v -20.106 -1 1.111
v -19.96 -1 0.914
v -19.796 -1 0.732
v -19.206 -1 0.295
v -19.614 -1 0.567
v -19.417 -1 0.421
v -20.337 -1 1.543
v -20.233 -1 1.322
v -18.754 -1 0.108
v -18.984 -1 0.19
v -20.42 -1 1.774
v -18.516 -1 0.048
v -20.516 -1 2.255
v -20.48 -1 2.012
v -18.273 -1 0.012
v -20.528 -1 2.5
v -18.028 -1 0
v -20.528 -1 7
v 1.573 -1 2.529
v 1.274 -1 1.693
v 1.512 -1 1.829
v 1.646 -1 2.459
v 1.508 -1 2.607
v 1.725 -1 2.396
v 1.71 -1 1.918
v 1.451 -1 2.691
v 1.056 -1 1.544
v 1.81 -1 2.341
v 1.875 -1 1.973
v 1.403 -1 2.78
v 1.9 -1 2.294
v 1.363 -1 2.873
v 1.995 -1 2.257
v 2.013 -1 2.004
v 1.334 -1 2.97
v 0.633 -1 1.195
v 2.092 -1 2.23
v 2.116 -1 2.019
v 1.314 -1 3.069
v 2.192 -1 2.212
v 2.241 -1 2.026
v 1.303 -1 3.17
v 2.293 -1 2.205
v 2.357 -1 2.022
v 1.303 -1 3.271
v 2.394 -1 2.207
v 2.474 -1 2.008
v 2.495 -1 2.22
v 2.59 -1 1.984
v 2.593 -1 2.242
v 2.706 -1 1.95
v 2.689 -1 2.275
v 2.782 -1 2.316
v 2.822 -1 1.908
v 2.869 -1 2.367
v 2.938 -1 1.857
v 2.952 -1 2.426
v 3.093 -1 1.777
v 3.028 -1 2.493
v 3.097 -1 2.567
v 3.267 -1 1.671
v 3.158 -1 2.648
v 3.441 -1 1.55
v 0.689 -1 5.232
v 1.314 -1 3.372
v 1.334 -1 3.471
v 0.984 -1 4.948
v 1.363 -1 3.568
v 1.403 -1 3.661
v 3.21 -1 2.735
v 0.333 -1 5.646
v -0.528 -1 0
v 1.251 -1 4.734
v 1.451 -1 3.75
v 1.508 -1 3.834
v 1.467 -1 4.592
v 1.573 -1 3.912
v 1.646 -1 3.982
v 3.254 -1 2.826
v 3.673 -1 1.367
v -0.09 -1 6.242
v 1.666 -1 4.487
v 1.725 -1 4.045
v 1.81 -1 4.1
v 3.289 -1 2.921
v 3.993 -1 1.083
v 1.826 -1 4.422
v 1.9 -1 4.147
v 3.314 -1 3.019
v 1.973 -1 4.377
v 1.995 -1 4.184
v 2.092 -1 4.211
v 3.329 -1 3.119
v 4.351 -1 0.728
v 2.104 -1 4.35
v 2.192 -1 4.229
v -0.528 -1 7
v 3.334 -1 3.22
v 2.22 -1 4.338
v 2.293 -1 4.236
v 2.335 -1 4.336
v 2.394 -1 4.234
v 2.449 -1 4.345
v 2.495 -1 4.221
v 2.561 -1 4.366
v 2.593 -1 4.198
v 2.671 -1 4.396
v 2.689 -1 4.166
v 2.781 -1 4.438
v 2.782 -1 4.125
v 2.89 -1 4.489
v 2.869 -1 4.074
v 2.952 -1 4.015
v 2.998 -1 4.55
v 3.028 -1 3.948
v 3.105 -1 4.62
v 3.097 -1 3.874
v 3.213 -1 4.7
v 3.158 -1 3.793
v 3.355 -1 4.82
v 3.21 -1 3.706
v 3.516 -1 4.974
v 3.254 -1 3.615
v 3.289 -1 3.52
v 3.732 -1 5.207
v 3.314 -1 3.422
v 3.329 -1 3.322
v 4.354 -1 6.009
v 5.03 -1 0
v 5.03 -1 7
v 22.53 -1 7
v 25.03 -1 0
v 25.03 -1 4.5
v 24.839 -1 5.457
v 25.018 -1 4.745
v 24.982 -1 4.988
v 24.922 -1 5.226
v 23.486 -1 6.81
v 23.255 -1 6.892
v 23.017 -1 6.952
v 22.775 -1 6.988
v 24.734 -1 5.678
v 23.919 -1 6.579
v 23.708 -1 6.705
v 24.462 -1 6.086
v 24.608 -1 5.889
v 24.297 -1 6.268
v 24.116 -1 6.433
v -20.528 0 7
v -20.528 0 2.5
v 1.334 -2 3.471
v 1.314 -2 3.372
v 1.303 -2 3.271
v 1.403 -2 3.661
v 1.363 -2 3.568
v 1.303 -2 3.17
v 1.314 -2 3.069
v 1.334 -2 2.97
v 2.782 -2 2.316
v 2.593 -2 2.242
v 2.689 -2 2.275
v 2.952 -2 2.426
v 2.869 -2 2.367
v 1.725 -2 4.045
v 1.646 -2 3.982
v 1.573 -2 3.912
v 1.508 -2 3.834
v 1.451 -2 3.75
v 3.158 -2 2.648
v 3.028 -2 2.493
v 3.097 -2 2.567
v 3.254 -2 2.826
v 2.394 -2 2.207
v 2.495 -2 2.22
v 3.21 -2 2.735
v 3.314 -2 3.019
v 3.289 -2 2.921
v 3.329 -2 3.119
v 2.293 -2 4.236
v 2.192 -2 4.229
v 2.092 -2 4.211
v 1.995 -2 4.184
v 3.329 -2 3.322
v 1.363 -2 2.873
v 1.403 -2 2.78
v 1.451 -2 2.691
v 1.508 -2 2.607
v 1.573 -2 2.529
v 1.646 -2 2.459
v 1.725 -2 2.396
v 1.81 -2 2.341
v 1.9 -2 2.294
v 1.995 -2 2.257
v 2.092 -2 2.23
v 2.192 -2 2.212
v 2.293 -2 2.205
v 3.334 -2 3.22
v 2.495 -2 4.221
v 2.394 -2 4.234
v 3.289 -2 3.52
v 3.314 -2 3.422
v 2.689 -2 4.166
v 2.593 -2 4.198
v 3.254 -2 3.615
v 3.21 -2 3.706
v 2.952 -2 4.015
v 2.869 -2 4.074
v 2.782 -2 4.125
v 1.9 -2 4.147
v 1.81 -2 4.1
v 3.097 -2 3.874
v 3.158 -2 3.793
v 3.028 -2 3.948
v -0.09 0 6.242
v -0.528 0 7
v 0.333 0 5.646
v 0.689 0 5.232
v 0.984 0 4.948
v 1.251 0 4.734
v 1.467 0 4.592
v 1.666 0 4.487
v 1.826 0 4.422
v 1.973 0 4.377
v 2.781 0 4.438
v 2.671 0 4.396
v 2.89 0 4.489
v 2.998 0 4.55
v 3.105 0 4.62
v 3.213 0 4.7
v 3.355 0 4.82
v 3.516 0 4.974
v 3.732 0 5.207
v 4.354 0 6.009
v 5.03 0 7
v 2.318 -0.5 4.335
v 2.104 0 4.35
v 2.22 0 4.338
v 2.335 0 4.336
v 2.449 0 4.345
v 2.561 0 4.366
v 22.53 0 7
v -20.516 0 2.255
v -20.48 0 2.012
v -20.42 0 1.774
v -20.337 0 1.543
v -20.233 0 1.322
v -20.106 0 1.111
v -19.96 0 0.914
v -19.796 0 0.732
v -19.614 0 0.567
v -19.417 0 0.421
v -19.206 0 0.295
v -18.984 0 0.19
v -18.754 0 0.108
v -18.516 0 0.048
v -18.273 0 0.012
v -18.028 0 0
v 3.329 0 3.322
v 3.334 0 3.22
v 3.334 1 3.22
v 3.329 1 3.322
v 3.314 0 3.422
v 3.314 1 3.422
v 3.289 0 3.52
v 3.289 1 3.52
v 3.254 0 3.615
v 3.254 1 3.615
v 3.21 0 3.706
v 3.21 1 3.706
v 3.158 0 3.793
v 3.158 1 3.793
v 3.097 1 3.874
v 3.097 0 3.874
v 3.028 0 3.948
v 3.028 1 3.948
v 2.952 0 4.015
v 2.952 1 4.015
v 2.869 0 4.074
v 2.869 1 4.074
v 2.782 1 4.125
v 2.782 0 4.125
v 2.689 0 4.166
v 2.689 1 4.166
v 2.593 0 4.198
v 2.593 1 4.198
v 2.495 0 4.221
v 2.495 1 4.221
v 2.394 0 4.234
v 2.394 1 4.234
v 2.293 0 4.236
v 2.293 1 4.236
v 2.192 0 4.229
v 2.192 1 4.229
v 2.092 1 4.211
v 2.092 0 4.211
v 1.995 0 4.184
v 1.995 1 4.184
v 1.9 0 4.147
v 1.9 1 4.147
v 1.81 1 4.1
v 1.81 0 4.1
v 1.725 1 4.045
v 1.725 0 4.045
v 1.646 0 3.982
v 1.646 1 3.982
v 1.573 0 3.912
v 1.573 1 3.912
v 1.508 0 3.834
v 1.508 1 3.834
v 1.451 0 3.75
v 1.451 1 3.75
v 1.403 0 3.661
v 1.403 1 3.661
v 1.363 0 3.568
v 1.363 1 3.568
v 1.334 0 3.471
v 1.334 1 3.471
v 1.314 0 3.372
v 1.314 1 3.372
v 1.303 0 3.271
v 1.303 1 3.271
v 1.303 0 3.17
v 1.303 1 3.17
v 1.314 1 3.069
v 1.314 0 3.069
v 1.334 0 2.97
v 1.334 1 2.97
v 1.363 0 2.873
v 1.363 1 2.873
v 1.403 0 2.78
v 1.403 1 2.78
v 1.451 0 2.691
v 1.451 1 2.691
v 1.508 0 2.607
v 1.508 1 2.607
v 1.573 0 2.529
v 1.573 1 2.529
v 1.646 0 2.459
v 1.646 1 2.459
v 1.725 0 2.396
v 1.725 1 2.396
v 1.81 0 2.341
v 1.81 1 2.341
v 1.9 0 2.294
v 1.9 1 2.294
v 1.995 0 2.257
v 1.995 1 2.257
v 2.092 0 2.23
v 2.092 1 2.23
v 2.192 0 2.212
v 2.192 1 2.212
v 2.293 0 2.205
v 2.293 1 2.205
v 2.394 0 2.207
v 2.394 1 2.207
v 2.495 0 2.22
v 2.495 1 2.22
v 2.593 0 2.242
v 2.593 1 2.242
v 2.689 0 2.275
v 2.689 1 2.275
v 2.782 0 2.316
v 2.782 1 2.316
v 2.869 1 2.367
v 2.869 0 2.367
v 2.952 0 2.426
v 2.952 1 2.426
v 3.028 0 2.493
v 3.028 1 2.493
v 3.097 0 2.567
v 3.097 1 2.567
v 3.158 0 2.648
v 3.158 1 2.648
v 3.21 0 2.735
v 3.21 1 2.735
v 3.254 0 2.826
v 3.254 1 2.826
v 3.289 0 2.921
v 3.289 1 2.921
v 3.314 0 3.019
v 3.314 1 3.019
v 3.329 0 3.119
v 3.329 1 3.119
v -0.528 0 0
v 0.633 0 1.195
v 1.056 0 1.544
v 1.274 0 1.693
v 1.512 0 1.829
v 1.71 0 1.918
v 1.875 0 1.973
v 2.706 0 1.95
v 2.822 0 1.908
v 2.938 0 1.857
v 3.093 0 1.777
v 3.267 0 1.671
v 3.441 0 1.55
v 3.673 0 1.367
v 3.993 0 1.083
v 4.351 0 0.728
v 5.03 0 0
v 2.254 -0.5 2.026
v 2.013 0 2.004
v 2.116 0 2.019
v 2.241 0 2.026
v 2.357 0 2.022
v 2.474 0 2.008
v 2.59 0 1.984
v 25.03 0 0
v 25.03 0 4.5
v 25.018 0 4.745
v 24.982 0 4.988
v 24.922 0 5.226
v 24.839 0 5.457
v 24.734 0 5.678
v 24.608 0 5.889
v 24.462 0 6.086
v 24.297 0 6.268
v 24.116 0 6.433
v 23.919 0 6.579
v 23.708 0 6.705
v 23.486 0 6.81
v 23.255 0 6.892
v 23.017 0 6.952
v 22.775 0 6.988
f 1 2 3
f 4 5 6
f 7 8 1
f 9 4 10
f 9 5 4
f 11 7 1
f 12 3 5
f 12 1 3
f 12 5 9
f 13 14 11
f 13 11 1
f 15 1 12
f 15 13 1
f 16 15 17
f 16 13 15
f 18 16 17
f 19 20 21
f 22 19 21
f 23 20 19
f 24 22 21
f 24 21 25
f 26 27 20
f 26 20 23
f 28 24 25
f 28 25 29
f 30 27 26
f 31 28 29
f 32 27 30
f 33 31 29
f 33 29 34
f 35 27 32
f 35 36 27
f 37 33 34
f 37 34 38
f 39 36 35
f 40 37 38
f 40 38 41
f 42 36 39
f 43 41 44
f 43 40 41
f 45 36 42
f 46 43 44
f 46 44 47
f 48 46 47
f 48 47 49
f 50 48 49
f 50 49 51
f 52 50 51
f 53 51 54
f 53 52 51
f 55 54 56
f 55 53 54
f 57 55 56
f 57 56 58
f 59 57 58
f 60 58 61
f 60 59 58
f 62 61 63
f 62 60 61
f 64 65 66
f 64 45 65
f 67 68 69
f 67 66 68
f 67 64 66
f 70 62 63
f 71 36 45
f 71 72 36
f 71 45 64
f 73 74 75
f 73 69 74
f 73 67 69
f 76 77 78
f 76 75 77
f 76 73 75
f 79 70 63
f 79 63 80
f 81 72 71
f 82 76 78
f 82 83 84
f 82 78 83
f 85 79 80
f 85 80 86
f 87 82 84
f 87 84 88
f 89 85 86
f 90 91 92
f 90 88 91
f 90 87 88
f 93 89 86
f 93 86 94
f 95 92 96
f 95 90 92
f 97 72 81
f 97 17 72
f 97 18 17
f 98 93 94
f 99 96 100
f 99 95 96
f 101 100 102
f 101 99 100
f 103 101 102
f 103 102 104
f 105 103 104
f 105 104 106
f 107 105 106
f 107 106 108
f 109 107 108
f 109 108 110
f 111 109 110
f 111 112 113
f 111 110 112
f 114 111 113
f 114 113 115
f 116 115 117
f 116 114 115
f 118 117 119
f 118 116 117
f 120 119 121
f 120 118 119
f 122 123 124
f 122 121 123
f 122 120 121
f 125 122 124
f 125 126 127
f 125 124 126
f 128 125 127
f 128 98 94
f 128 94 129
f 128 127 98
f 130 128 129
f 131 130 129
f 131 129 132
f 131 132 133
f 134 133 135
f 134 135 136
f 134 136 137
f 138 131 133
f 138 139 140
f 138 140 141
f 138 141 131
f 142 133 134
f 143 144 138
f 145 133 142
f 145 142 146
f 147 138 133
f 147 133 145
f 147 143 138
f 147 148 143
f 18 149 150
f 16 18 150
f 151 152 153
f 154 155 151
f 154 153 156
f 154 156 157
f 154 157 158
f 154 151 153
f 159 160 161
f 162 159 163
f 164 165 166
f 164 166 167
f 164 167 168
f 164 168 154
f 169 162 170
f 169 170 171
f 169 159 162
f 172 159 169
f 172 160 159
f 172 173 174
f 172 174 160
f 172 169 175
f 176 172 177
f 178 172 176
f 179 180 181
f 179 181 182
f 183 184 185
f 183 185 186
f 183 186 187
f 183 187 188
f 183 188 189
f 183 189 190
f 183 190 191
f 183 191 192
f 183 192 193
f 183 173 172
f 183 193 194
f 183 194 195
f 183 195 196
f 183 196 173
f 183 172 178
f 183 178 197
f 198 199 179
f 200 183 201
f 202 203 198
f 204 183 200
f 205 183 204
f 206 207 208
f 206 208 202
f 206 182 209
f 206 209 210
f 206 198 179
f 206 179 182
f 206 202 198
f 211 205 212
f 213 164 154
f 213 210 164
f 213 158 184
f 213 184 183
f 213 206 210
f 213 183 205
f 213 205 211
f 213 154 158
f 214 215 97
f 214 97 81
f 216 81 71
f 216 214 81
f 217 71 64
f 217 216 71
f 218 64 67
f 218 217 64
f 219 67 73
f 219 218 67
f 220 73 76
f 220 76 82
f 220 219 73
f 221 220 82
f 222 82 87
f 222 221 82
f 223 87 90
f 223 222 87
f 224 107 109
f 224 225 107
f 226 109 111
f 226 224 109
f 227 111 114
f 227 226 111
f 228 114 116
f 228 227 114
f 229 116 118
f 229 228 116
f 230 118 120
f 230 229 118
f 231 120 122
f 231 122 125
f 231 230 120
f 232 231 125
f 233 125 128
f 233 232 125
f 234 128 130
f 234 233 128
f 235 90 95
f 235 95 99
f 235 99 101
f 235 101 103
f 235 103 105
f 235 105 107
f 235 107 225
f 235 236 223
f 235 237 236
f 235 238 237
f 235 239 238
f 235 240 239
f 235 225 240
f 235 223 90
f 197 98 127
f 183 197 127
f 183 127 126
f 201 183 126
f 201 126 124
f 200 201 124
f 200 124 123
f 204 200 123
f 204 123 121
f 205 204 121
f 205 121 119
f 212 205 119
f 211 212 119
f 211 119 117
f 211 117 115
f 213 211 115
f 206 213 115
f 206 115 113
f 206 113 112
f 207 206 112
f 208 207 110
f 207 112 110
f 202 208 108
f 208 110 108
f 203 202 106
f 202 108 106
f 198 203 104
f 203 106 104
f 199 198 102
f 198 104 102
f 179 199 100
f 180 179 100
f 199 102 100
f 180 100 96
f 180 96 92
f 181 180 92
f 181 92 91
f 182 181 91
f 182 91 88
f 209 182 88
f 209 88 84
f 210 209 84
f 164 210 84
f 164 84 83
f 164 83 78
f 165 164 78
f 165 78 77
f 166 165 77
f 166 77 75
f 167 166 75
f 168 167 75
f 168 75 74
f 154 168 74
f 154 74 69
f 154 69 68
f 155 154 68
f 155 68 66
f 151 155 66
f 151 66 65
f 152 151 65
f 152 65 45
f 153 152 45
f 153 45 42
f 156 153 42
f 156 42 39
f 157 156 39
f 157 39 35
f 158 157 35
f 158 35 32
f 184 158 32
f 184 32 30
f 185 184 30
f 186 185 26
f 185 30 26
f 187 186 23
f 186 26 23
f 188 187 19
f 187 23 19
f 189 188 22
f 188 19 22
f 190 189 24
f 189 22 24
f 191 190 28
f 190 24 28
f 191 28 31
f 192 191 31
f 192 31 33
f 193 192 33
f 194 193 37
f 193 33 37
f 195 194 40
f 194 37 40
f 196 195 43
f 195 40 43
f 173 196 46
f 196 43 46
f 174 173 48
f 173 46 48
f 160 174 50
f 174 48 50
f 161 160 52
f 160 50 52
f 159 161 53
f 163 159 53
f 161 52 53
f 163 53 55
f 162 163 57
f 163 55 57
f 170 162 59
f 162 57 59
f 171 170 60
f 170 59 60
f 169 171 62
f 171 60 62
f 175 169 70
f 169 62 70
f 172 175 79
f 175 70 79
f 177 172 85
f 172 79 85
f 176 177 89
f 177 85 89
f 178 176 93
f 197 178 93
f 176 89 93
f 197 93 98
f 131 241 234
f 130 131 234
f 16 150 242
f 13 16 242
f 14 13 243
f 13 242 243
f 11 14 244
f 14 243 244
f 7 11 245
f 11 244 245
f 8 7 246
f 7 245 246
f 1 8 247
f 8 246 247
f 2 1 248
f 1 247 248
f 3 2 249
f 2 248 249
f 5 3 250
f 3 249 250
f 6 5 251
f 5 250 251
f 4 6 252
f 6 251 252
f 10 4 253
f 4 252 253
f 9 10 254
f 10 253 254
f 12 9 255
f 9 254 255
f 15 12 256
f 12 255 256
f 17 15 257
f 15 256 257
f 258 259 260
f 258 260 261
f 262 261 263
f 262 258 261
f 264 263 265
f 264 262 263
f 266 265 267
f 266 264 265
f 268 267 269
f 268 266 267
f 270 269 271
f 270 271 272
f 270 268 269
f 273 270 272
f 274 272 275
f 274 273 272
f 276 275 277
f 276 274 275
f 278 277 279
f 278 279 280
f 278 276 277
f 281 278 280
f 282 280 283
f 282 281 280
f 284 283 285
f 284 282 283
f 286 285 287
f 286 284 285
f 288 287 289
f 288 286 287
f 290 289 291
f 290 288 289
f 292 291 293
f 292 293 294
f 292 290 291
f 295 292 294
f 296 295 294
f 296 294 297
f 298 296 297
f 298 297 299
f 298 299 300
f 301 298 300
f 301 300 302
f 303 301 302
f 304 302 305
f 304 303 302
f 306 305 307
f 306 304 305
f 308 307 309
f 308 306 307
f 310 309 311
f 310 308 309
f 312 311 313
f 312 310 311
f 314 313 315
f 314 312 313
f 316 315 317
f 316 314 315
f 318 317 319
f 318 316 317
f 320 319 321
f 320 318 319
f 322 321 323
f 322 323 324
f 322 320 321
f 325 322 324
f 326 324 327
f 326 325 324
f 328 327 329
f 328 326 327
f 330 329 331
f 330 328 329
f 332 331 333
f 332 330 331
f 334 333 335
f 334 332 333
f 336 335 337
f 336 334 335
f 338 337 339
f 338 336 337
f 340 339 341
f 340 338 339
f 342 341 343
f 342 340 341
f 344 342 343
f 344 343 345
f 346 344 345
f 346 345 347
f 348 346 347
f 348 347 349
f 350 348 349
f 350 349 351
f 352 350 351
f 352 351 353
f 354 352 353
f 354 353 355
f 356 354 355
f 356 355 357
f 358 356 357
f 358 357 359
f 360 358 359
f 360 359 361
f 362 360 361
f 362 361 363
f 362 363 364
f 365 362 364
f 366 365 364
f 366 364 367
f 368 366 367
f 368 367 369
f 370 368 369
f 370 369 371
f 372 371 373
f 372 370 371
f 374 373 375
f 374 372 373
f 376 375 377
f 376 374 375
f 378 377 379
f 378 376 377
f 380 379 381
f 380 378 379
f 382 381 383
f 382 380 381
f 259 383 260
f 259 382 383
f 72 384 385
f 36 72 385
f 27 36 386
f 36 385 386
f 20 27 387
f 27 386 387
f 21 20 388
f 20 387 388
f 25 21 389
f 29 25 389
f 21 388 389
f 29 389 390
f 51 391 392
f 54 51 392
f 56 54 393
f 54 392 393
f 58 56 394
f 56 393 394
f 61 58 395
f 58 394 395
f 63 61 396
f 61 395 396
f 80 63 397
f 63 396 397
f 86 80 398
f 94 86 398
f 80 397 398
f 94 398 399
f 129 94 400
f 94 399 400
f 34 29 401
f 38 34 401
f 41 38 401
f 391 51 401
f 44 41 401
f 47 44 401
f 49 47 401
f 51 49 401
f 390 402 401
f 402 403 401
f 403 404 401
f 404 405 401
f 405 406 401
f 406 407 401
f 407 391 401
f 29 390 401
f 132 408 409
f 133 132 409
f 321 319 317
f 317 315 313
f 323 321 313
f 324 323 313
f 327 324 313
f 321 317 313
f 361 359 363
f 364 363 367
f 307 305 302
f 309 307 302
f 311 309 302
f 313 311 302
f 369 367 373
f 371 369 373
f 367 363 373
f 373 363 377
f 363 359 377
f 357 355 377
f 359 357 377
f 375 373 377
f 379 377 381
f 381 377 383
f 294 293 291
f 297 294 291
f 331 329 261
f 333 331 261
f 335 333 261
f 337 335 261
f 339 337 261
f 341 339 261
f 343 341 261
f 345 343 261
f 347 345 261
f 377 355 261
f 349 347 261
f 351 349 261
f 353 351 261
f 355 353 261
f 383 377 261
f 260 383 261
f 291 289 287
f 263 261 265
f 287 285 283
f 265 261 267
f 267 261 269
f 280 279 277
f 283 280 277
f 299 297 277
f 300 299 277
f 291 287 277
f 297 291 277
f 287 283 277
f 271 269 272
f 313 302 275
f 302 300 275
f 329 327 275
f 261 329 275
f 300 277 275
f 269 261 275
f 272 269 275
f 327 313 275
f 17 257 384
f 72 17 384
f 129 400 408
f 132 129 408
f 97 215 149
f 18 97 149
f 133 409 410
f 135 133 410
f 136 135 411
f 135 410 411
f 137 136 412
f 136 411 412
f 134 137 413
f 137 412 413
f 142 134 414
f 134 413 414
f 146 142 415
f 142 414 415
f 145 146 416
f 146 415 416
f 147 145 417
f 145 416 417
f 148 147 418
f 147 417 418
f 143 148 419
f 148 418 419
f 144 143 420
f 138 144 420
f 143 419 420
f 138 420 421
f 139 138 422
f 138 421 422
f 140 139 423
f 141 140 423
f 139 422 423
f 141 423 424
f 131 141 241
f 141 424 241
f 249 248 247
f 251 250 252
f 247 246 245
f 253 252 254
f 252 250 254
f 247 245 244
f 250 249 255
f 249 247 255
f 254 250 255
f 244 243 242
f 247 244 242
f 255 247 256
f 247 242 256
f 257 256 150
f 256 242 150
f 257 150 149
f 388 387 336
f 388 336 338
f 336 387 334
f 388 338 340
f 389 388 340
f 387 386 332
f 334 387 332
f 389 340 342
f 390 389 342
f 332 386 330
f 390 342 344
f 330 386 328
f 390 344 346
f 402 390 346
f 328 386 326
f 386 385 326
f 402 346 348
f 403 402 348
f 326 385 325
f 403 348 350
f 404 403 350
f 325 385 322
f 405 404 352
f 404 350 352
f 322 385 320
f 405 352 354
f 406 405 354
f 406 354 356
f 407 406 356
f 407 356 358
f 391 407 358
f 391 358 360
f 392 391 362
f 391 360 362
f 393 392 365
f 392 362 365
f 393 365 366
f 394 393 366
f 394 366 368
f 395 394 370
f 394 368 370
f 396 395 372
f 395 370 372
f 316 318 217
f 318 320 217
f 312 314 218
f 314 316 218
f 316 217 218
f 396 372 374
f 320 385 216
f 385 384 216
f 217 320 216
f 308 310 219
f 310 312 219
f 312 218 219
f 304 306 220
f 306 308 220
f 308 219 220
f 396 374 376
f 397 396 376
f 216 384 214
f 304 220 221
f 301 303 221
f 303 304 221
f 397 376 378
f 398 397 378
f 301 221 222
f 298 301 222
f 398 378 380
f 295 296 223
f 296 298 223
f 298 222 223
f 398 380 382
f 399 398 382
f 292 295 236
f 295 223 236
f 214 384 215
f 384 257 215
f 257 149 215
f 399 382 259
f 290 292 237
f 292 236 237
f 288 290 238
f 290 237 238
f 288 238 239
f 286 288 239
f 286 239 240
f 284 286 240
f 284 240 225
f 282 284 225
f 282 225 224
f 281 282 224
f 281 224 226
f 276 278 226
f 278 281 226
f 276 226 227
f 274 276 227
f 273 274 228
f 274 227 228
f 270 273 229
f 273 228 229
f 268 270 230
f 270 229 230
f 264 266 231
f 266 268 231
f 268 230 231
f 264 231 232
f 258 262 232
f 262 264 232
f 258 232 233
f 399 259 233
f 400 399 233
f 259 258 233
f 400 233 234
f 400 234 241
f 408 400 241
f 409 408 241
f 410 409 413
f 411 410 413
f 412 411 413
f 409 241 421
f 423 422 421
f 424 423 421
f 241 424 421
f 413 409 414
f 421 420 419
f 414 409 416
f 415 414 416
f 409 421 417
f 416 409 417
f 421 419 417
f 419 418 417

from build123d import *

# Parameters (mm, degrees)
F0_R     = 1.016
F1_DEPTH = 1
F2_DEPTH = 2
F3_DEPTH = 1


with BuildPart() as f1:
    # F0 (on Front) → F1 (new body)
    with BuildSketch(Plane.XZ):
        with BuildLine():
            Line((22.5296217646, 7), (5.0296217646, 7))
            Line((5.0296217646, 7), (5.0296217646, 0))
            Line((5.0296217646, 0), (25.0296217646, 0))
            Line((25.0296217646, 0), (25.0296217646, 4.5))
            ThreePointArc((25.0296217646, 4.5), (24.2973887176, 6.267766953), (22.5296217646, 7))
        make_face()
        with BuildLine():
            Line((-0.5277903524, 7), (-20.5277903524, 7))
            Line((-20.5277903524, 7), (-20.5277903524, 2.5))
            ThreePointArc((-20.5277903524, 2.5), (-19.7955573054, 0.732233047), (-18.0277903524, 0))
            Line((-18.0277903524, 0), (-0.5277903524, 0))
            Line((-0.5277903524, 0), (-0.5277903524, 7))
        make_face()
        with BuildLine():
            add(Edge.make_bspline(
                [(-0.5277903524, 7), (0.2936347767, 5.4160328527), (2.4654319937, 3.2330255819), (4.0015688672, 5.4588735962), (5.0296217646, 7)],
                knots=[0, 0, 0, 0, 0.503153471, 1, 1, 1, 1], degree=3))
            Line((-0.5277903524, 7), (-0.5277903524, 0))
            add(Edge.make_bspline(
                [(-0.5277903524, 0), (0.3996940581, 1.0133841191), (2.2540528119, 3.0394852076), (4.104635181, 1.0129391145), (5.0296217646, 0)],
                knots=[0, 0, 0, 0, 0.5001646338, 1, 1, 1, 1], degree=3))
            Line((5.0296217646, 0), (5.0296217646, 7))
        make_face()
        with Locations((2.3182034492, 3.2204561867)):
            Circle(F0_R, mode=Mode.SUBTRACT)
    extrude(amount=F1_DEPTH)

    # F0 (on Front) → F2 (join)
    with BuildSketch(Plane.XZ):
        with Locations((2.3182034492, 3.2204561867)):
            Circle(F0_R)
    extrude(amount=F2_DEPTH)

    # F0 (on Front) → F3 (join)
    with BuildSketch(Plane.XZ):
        with Locations((2.3182034492, 3.2204561867)):
            Circle(F0_R)
    extrude(amount=-F3_DEPTH)


solid = f1.part
